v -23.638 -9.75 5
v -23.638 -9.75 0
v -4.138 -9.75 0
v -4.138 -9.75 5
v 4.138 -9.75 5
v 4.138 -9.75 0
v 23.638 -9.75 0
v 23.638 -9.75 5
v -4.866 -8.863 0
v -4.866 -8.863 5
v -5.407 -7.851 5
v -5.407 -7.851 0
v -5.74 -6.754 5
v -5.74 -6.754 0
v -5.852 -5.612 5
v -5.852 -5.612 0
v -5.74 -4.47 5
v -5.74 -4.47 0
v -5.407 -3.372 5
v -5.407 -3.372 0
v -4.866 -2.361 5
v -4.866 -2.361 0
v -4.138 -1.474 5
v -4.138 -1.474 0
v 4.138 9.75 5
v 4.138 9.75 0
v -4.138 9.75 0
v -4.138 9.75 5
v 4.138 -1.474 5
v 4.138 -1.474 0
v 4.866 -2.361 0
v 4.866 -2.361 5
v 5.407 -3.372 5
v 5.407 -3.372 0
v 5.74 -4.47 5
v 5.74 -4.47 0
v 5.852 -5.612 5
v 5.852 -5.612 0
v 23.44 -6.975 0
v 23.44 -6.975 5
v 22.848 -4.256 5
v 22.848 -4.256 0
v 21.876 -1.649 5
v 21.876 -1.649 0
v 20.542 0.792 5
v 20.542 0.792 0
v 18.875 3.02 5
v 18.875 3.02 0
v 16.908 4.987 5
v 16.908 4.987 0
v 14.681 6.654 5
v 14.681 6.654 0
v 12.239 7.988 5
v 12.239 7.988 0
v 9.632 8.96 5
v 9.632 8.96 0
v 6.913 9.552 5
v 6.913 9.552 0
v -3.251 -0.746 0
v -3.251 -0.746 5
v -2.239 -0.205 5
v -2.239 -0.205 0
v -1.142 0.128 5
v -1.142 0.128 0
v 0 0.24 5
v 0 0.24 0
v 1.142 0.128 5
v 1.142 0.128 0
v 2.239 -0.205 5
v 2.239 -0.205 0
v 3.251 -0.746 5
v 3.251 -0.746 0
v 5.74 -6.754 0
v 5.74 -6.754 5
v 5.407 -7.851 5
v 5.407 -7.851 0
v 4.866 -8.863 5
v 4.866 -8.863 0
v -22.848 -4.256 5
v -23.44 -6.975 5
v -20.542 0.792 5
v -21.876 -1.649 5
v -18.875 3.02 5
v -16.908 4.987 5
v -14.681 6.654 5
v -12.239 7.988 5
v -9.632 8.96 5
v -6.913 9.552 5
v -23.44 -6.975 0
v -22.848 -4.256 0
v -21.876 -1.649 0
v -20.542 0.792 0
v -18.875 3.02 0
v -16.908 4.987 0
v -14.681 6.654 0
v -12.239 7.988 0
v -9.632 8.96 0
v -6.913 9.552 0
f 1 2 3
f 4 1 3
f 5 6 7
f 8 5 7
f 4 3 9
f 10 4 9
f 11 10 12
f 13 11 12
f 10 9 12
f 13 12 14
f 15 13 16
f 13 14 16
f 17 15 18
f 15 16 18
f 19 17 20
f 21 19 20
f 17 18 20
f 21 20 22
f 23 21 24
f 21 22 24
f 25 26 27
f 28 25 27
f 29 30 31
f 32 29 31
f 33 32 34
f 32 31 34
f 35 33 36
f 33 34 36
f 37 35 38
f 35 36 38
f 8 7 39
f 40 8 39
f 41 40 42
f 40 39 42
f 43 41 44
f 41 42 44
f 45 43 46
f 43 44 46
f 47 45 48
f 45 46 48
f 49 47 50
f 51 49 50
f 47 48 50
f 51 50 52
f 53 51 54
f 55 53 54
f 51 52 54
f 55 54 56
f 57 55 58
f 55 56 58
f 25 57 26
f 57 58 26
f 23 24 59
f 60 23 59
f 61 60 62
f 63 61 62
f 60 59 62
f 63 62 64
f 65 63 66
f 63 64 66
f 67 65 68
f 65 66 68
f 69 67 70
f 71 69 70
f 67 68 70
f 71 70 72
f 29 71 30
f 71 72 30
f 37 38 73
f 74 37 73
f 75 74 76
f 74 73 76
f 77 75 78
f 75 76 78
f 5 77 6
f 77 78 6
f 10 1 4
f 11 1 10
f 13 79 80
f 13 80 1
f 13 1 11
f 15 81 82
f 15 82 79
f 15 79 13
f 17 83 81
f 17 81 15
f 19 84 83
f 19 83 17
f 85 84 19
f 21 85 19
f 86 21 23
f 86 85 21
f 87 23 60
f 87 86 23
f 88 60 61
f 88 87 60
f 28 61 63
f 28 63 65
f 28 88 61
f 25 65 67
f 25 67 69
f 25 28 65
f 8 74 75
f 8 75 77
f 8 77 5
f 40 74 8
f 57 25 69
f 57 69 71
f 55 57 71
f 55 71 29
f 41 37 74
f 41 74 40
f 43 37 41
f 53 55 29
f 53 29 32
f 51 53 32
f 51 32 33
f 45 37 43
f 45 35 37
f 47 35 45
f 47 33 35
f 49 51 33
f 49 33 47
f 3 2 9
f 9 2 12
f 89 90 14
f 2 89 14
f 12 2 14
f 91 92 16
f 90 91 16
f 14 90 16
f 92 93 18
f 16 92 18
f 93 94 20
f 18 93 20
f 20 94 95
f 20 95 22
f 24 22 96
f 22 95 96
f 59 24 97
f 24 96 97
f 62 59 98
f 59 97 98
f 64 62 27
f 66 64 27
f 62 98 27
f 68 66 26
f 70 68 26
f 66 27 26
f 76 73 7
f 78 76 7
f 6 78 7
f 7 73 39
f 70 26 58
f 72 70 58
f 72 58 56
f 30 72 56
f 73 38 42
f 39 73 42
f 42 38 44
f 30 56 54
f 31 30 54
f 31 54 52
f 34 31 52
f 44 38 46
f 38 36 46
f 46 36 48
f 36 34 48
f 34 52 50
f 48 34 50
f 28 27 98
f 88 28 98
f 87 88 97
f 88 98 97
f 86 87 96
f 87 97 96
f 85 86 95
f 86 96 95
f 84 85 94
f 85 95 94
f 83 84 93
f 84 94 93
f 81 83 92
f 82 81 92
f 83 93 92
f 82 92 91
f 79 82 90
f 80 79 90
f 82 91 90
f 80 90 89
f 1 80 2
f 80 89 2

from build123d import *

# Parameters (mm, degrees)
F1_DEPTH = 5


with BuildPart() as f1:
    # F0 (on Top) → F1 (new body)
    with BuildSketch(Plane.XY):
        with BuildLine():
            ThreePointArc((5.8520560333, -5.611971495), (5.4065947922, -7.8514563842), (4.138028505, -9.75))
            Line((4.138028505, -9.75), (9.8424661541, -9.75))
            Line((9.8424661541, -9.75), (12.414085515, -9.75))
            ThreePointArc((12.414085515, -9.75), (9.9900845383, -3.8979439667), (4.138028505, -1.47394299))
            ThreePointArc((4.138028505, -1.47394299), (5.4065947922, -3.3724866058), (5.8520560333, -5.611971495))
        make_face()
        with BuildLine():
            Line((-12.414085515, -9.75), (-4.138028505, -9.75))
            ThreePointArc((-4.138028505, -9.75), (-5.8520560333, -5.611971495), (-4.138028505, -1.47394299))
            ThreePointArc((-4.138028505, -1.47394299), (-9.9900845383, -3.8979439667), (-12.414085515, -9.75))
        make_face()
        with BuildLine():
            ThreePointArc((-4.138028505, -1.47394299), (0, 0.2400845383), (4.138028505, -1.47394299))
            Line((4.138028505, -1.47394299), (4.138028505, 7.9066384221))
            ThreePointArc((4.138028505, 7.9066384221), (2.1083185822, 8.7224970718), (0, 9.305884133))
            ThreePointArc((0, 9.305884133), (-2.1083185822, 8.7224970718), (-4.138028505, 7.9066384221))
            Line((-4.138028505, 7.9066384221), (-4.138028505, -1.47394299))
        make_face()
        with BuildLine():
            Line((4.138028505, 7.9066384221), (4.138028505, -1.47394299))
            ThreePointArc((4.138028505, -1.47394299), (9.9900845383, -3.8979439667), (12.414085515, -9.75))
            Line((12.414085515, -9.75), (15.361971495, -9.75))
            ThreePointArc((15.361971495, -9.75), (12.3184764656, 0.7110441234), (4.138028505, 7.9066384221))
        make_face()
        with BuildLine():
            ThreePointArc((-12.414085515, -9.75), (-9.9900845383, -3.8979439667), (-4.138028505, -1.47394299))
            Line((-4.138028505, -1.47394299), (-4.138028505, 7.9066384221))
            ThreePointArc((-4.138028505, 7.9066384221), (-12.3184764656, 0.7110441234), (-15.361971495, -9.75))
            Line((-15.361971495, -9.75), (-12.414085515, -9.75))
        make_face()
        with BuildLine():
            ThreePointArc((0, 9.305884133), (2.1083185822, 8.7224970718), (4.138028505, 7.9066384221))
            Line((4.138028505, 7.9066384221), (4.138028505, 9.75))
            ThreePointArc((4.138028505, 9.75), (2.057132135, 9.6386531326), (0, 9.305884133))
        make_face()
        with BuildLine():
            Line((4.138028505, 9.75), (4.138028505, 7.9066384221))
            ThreePointArc((4.138028505, 7.9066384221), (12.3184764656, 0.7110441234), (15.361971495, -9.75))
            Line((15.361971495, -9.75), (23.638028505, -9.75))
            ThreePointArc((23.638028505, -9.75), (17.9266107381, 4.0385822331), (4.138028505, 9.75))
        make_face()
        with BuildLine():
            ThreePointArc((-15.361971495, -9.75), (-12.3184764656, 0.7110441234), (-4.138028505, 7.9066384221))
            Line((-4.138028505, 7.9066384221), (-4.138028505, 9.75))
            ThreePointArc((-4.138028505, 9.75), (-17.9266107381, 4.0385822331), (-23.638028505, -9.75))
            Line((-23.638028505, -9.75), (-15.361971495, -9.75))
        make_face()
        with BuildLine():
            Line((-4.138028505, 9.75), (-4.138028505, 7.9066384221))
            ThreePointArc((-4.138028505, 7.9066384221), (-2.1083185822, 8.7224970718), (0, 9.305884133))
            ThreePointArc((0, 9.305884133), (-2.057132135, 9.6386531326), (-4.138028505, 9.75))
        make_face()
        with BuildLine():
            ThreePointArc((0, 9.305884133), (2.057132135, 9.6386531326), (4.138028505, 9.75))
            Line((4.138028505, 9.75), (-4.138028505, 9.75))
            ThreePointArc((-4.138028505, 9.75), (-2.057132135, 9.6386531326), (0, 9.305884133))
        make_face()
    extrude(amount=F1_DEPTH)


solid = f1.part
